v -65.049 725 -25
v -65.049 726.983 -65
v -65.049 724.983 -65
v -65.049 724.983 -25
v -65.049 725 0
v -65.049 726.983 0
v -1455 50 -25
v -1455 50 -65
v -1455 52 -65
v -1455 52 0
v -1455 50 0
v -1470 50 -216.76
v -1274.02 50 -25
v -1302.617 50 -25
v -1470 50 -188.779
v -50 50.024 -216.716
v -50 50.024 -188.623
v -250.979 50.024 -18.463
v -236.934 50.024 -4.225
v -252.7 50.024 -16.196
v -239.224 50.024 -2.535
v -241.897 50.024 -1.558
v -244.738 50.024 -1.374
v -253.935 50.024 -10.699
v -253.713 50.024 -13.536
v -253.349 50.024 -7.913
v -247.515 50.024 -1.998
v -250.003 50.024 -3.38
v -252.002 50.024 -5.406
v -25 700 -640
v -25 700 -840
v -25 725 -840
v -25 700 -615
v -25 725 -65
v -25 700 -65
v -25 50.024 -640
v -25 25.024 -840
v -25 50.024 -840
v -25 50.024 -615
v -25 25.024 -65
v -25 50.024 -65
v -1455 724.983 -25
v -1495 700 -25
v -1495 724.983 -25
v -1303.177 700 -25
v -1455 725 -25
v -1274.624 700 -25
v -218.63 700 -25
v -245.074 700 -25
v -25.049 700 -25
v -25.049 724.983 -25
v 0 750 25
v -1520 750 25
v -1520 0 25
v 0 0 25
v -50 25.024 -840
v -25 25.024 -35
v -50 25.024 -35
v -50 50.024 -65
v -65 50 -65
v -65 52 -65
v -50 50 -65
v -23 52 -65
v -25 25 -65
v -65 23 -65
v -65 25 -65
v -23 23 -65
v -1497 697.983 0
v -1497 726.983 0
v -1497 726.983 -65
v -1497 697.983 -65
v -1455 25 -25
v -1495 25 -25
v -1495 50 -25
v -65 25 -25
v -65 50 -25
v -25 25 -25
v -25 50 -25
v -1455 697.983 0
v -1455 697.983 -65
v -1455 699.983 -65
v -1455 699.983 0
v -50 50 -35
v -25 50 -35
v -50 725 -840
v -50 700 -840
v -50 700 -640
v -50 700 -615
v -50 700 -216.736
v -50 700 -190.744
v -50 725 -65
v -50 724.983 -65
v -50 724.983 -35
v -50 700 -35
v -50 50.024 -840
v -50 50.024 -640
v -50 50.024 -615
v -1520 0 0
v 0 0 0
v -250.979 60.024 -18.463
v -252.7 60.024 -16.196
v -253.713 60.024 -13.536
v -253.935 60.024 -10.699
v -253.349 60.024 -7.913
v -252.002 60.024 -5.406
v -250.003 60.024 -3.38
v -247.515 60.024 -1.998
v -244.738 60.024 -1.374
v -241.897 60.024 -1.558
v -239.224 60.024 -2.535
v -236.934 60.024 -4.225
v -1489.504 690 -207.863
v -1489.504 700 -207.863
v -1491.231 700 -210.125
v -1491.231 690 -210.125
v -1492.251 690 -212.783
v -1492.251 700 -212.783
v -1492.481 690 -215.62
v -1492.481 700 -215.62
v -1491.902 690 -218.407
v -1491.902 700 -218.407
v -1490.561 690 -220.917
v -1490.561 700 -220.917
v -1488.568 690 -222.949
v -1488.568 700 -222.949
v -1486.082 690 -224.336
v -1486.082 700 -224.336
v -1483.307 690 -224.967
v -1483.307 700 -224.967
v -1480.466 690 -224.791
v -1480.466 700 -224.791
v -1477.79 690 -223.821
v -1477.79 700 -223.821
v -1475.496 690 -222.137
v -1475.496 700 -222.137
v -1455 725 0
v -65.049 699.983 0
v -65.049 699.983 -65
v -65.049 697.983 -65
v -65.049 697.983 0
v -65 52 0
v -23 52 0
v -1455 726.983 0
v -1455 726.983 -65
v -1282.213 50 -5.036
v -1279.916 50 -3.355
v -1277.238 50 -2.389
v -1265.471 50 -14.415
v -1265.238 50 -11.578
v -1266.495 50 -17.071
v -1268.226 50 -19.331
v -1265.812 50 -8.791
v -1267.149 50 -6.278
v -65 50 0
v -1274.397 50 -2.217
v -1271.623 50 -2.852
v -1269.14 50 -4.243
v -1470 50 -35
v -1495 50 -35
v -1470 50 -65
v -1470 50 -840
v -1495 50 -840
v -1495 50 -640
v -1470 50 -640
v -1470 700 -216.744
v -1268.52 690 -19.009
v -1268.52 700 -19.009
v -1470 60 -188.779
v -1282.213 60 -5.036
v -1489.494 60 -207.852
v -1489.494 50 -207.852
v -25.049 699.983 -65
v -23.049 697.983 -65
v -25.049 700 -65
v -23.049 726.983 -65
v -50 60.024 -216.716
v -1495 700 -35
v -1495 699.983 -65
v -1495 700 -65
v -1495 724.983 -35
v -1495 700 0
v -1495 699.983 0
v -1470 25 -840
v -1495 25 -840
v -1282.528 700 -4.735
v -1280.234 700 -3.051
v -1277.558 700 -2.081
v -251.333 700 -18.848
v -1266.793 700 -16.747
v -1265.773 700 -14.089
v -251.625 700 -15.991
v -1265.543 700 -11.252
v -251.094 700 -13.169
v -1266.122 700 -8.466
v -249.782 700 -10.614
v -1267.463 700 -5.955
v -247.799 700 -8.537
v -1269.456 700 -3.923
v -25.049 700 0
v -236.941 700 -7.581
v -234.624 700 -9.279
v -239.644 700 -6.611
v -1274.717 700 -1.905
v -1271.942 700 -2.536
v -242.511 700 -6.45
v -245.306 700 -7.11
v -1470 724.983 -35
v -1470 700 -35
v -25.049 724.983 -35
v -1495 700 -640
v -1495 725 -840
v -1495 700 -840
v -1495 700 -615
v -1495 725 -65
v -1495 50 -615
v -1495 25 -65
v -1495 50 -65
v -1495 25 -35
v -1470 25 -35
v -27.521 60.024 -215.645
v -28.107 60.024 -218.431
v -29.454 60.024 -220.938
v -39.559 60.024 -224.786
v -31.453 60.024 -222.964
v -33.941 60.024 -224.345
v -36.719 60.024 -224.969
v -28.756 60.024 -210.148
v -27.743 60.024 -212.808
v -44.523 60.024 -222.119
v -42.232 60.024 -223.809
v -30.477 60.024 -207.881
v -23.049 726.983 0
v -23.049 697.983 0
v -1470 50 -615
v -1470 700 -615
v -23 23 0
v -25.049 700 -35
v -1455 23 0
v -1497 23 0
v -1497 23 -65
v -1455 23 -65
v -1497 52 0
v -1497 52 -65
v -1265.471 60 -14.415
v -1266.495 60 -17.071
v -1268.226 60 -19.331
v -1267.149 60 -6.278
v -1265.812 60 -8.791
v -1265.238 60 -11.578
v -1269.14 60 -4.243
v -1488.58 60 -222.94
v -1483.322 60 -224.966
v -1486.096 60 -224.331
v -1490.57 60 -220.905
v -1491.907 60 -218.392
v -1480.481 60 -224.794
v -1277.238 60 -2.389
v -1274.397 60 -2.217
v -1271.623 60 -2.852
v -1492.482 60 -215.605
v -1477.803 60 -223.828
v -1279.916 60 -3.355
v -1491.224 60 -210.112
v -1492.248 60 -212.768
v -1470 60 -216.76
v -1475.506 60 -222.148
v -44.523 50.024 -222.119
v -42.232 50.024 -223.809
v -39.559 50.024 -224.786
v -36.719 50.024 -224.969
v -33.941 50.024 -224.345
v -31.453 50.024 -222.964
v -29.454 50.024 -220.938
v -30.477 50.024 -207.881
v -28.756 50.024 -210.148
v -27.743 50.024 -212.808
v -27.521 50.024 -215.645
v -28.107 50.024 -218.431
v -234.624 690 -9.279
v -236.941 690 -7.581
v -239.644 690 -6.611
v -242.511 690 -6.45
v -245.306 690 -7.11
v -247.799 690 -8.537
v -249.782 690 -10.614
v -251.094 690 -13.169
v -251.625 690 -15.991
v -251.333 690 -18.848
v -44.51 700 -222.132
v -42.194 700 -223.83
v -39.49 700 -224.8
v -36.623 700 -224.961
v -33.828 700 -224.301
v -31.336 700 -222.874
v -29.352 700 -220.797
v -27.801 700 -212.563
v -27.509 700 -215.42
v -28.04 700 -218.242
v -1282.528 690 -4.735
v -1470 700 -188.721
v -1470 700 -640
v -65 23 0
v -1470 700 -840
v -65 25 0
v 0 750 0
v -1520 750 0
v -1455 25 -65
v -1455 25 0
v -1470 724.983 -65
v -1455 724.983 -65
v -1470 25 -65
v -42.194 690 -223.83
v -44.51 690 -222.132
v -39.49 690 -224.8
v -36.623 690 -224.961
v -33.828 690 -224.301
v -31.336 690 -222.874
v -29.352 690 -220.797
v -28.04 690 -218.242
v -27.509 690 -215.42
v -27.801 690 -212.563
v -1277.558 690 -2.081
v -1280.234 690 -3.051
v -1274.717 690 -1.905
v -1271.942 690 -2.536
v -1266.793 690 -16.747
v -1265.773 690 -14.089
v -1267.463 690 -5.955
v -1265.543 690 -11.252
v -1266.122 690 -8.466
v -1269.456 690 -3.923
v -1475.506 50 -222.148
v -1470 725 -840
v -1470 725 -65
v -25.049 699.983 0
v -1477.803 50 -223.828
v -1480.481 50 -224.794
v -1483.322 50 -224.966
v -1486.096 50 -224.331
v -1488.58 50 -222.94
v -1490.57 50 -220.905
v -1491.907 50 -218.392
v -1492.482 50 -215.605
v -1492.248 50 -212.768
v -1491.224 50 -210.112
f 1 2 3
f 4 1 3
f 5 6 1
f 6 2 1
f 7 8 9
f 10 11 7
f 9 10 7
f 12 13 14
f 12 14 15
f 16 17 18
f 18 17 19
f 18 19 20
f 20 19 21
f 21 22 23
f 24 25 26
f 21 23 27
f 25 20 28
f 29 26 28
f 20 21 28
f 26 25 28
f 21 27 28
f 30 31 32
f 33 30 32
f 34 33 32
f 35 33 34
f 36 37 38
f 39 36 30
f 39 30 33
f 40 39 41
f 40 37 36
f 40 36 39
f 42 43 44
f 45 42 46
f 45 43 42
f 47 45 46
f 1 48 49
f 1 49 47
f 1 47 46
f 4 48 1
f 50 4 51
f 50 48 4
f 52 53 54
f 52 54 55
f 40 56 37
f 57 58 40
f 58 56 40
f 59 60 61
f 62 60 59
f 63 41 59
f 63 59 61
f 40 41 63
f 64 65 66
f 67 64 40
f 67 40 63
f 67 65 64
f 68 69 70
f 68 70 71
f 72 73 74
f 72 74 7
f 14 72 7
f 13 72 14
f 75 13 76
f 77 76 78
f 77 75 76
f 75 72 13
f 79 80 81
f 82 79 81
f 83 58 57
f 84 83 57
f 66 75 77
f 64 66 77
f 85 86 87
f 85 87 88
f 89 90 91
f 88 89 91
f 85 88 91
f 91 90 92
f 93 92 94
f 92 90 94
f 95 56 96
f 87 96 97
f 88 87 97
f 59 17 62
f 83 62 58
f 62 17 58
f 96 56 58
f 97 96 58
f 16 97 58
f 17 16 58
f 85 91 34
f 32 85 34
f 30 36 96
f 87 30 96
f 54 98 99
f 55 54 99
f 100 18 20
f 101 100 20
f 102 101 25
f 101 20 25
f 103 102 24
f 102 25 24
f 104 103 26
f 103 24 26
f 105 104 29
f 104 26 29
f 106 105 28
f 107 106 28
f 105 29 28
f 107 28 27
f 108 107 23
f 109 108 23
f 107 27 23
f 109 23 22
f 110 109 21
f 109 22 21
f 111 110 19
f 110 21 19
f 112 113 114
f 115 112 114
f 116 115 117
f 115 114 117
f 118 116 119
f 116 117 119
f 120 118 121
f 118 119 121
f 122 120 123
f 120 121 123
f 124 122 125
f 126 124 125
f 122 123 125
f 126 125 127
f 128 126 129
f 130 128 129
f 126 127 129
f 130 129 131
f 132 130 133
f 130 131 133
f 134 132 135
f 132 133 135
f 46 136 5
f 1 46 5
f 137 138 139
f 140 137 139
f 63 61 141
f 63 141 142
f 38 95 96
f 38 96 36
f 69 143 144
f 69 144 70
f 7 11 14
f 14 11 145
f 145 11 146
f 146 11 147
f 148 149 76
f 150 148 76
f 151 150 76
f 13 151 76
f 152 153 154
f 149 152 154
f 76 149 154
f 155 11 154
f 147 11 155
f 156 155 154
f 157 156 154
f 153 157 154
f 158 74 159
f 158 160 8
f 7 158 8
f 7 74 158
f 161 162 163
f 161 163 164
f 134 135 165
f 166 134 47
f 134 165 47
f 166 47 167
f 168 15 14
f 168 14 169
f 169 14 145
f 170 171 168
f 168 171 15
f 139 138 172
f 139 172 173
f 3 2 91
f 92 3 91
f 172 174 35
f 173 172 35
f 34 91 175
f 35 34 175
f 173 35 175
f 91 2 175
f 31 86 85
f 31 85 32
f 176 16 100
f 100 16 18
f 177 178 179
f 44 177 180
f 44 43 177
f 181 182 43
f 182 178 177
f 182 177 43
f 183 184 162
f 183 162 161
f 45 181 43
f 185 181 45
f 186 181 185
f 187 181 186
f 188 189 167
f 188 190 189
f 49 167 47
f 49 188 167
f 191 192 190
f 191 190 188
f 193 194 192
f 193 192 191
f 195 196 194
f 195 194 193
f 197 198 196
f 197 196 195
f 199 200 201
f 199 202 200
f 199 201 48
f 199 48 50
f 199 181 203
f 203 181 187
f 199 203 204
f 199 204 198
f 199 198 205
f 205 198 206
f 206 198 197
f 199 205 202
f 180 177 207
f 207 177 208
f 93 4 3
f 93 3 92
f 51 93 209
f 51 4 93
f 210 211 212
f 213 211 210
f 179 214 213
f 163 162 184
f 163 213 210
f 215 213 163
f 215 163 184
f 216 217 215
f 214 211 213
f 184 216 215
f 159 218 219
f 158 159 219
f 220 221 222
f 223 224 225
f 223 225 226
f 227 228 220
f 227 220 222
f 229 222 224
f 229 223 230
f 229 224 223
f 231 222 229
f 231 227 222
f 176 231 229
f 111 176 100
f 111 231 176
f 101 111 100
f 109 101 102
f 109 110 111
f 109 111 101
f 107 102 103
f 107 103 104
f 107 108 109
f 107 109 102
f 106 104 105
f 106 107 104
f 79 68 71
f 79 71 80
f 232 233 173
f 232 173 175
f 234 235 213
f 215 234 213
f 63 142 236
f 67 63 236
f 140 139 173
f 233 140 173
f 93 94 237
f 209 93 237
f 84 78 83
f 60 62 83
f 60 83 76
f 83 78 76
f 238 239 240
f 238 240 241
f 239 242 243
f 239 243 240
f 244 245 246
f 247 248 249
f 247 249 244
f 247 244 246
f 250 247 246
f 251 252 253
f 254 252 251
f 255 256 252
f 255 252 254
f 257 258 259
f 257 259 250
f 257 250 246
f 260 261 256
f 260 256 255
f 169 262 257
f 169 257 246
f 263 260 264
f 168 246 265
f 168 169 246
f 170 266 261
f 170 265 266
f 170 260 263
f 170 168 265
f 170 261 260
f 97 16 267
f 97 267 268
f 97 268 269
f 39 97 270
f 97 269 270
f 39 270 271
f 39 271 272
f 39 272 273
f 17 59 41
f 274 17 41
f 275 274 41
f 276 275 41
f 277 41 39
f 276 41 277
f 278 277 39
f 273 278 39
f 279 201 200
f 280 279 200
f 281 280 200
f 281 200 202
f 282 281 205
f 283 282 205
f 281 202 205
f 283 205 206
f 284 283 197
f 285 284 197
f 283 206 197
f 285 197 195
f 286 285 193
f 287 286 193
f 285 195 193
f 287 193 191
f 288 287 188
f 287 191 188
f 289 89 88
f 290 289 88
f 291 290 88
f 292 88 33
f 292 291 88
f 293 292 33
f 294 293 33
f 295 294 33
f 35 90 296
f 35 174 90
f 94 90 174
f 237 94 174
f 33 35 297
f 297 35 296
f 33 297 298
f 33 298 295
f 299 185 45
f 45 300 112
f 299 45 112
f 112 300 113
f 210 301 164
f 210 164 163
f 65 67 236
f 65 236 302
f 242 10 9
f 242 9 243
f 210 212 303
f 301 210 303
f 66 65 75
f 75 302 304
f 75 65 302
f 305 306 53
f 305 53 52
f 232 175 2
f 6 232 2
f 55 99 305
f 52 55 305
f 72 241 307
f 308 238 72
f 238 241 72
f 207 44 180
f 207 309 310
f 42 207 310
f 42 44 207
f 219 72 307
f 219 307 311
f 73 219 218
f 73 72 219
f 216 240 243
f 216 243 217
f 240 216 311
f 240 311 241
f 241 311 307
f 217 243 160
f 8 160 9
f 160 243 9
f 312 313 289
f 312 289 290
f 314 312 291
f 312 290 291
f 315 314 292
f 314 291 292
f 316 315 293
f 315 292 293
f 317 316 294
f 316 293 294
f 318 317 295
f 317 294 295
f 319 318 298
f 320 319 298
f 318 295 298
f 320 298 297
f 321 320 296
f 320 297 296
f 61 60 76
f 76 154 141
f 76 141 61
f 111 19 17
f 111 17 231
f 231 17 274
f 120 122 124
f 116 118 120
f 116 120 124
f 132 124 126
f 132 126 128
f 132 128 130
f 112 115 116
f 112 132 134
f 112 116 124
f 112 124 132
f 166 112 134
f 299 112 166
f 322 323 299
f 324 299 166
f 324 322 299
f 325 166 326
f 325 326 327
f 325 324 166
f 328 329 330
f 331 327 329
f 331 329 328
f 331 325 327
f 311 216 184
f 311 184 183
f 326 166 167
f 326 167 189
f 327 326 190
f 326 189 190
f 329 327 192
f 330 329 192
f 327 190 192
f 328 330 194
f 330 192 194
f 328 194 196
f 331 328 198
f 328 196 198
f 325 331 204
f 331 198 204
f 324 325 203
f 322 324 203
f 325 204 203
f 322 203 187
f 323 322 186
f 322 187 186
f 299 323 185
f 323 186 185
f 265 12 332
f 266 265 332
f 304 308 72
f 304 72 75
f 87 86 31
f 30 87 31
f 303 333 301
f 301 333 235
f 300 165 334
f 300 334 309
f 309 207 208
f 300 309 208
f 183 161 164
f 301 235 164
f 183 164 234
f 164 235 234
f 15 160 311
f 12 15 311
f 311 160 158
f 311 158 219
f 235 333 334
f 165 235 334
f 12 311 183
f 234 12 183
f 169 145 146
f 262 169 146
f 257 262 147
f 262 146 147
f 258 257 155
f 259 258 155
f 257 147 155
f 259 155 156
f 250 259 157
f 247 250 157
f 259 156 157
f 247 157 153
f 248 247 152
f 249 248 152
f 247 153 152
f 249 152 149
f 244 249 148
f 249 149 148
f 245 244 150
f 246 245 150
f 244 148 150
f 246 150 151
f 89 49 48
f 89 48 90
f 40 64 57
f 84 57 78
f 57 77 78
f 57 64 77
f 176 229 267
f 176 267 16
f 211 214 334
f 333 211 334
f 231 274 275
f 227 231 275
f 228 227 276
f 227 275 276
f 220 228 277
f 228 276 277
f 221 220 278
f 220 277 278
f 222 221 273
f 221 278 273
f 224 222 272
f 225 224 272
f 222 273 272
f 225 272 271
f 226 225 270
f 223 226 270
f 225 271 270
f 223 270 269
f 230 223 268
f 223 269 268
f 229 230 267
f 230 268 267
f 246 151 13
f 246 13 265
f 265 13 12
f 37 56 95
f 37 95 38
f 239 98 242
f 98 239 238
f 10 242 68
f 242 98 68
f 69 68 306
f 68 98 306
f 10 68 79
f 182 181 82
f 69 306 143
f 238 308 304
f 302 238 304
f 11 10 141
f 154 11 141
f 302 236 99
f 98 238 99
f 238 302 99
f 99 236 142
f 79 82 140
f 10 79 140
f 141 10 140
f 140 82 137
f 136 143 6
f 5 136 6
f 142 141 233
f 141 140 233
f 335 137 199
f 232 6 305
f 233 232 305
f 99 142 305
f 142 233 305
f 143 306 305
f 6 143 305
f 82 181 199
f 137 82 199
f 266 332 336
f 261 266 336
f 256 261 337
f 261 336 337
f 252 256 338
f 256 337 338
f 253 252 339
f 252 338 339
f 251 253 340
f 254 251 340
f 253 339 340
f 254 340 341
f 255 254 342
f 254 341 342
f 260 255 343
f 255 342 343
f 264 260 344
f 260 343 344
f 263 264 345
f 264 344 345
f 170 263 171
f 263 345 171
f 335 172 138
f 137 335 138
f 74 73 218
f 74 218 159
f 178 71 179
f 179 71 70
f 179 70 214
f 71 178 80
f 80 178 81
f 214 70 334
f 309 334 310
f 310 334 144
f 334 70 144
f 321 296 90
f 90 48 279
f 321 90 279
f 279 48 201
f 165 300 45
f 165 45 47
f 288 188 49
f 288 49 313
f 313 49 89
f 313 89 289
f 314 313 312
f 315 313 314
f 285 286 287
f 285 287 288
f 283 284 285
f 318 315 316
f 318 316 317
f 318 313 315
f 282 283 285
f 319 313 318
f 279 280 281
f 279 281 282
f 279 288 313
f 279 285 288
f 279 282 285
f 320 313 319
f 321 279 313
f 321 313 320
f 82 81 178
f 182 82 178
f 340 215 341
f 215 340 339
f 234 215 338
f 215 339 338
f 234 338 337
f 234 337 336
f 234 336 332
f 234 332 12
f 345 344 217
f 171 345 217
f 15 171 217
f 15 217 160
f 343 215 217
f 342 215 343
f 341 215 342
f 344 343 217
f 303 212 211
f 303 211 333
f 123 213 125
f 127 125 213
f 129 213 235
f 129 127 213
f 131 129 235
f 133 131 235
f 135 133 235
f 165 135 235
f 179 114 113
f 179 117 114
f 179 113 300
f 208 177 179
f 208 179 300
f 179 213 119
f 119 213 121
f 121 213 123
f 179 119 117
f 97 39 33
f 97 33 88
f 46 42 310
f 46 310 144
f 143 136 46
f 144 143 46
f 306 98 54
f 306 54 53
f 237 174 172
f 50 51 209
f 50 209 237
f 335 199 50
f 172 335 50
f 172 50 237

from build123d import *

# Parameters (mm, degrees)
F0_W      = 1520
F0_H      = 750
F1_DEPTH  = 25
F2_W      = 1470
F2_H      = 25
F3_DEPTH  = 25
F5_DEPTH  = 65
F7_W      = 25
F7_H      = 25
F8_DEPTH  = 805
F10_DEPTH = 65
F12_W     = 25
F12_H     = 25
F13_DEPTH = 805
F15_W     = 25
F15_H     = 25
F16_DEPTH = 805
F18_W     = 25
F18_H     = 25
F19_DEPTH = 650
F21_W     = 25
F21_H     = 25
F22_DEPTH = 650
F24_DEPTH = 10
F26_DEPTH = 10
F29_DEPTH = 10
F31_DEPTH = 10


with BuildPart() as f1:
    # F0 (on Top) → F1 (new body)
    with BuildSketch(Plane.XY):
        with Locations((-760, 375)):
            Rectangle(F0_W, F0_H)
    extrude(amount=F1_DEPTH)

    # F2 (on face) → F3 (join)
    with BuildSketch(Plane(origin=(0, 0, 0), x_dir=(1, 0, 0), z_dir=(0, 0, -1))):
        with Locations((-760, -37.5)):
            Rectangle(F2_W, F2_H)
        with Locations((-760, -712.5)):
            Rectangle(F2_W, F2_H)
    extrude(amount=F3_DEPTH)

    # F4 (on face) → F5 (join)
    with BuildSketch(Plane(origin=(0, 0, 0), x_dir=(1, 0, 0), z_dir=(0, 0, -1))):
        Polygon((-65, -25), (-25, -25), (-25, -50), (-65, -50), (-65, -52), (-23, -52), (-23, -23), (-65, -23), align=None)
    extrude(amount=F5_DEPTH)

    # F7 (on offset) → F8 (join)
    with BuildSketch(Plane(origin=(0, 0, -35), x_dir=(1, 0, 0), z_dir=(0, 0, -1))):
        with Locations((-37.5, -37.523640207)):
            Rectangle(F7_W, F7_H)
    extrude(amount=F8_DEPTH)

    # F9 (on face) → F10 (join)
    with BuildSketch(Plane.XY):
        Polygon((-1495, 724.9829173088), (-1455, 724.9829173088), (-1455, 726.9829173088), (-1497, 726.9829173088), (-1497, 697.9829173088), (-1455, 697.9829173088), (-1455, 699.9829173088), (-1495, 699.9829173088), align=None)
        Polygon((-65.0490959734, 726.9829173088), (-65.0490959734, 724.9829173088), (-25.0490959734, 724.9829173088), (-25.0490959734, 699.9829173088), (-65.0490959734, 699.9829173088), (-65.0490959734, 697.9829173088), (-23.0490959734, 697.9829173088), (-23.0490959734, 726.9829173088), align=None)
        Polygon((-1455, 25), (-1495, 25), (-1495, 50), (-1455, 50), (-1455, 52), (-1497, 52), (-1497, 23), (-1455, 23), align=None)
    extrude(amount=-F10_DEPTH)

    # F12 (on offset) → F13 (join)
    with BuildSketch(Plane(origin=(0, 0, -35), x_dir=(1, 0, 0), z_dir=(0, 0, -1))):
        with Locations((-1482.5, -37.5)):
            Rectangle(F12_W, F12_H)
    extrude(amount=F13_DEPTH)

    # F15 (on offset) → F16 (join)
    with BuildSketch(Plane(origin=(0, 0, -35), x_dir=(1, 0, 0), z_dir=(0, 0, -1))):
        with Locations((-37.5, -712.5)):
            Rectangle(F15_W, F15_H)
        with Locations((-1482.5, -712.5)):
            Rectangle(F15_W, F15_H)
    extrude(amount=F16_DEPTH)

    # F18 (on offset) → F19 (join)
    with BuildSketch(Plane(origin=(0, 50.023640207, 0), x_dir=(-1, 0, 0), z_dir=(0, 1, 0))):
        with Locations((37.5, -627.5)):
            Rectangle(F18_W, F18_H)
    extrude(amount=F19_DEPTH)

    # F21 (on offset) → F22 (join)
    with BuildSketch(Plane(origin=(0, 50, 0), x_dir=(-1, 0, 0), z_dir=(0, 1, 0))):
        with Locations((1482.5, -627.5)):
            Rectangle(F21_W, F21_H)
    extrude(amount=F22_DEPTH)

    # F23 (on face) → F24 (join)
    with BuildSketch(Plane.XZ.offset(-700)):
        with BuildLine():
            Line((-50, -190.7444713597), (-234.6244849475, -9.2794851613))
            ThreePointArc((-234.6244849475, -9.2794851613), (-246.6039118675, -7.7336055545), (-251.332803081, -18.8481906111))
            Line((-251.332803081, -18.8481906111), (-50, -216.7355636904))
            Line((-50, -216.7355636904), (-50, -190.7444713597))
        make_face()
        with BuildLine():
            Line((-27.8014624786, -212.5631229112), (-50, -190.7444713597))
            Line((-50, -190.7444713597), (-50, -216.7355636904))
            Line((-50, -216.7355636904), (-44.5097806121, -222.131828361))
            ThreePointArc((-44.5097806121, -222.131828361), (-32.5303536921, -223.6777079678), (-27.8014624786, -212.5631229112))
        make_face()
    extrude(amount=F24_DEPTH)

    # F25 (on face) → F26 (join)
    with BuildSketch(Plane(origin=(0, 50.023640207, 0), x_dir=(-1, 0, 0), z_dir=(0, 1, 0))):
        with BuildLine():
            Line((50, -188.6229664357), (50, -216.7160920101))
            Line((50, -216.7160920101), (250.9788283543, -18.4630064225))
            ThreePointArc((250.9788283543, -18.4630064225), (251.07538107, -4.3212004002), (236.9335750477, -4.2246476845))
            Line((236.9335750477, -4.2246476845), (50, -188.6229664357))
        make_face()
        with BuildLine():
            ThreePointArc((30.4773733467, -207.880820631), (30.380820631, -222.0226266533), (44.5226266533, -222.119179369))
            Line((44.5226266533, -222.119179369), (50, -216.7160920101))
            Line((50, -216.7160920101), (50, -188.6229664357))
            Line((50, -188.6229664357), (30.4773733467, -207.880820631))
        make_face()
    extrude(amount=F26_DEPTH)

    # F28 (on offset) → F29 (join)
    with BuildSketch(Plane.XZ.offset(-700)):
        with BuildLine():
            ThreePointArc((-1268.519621658, -19.0091897955), (-1268.3869301053, -4.8676766886), (-1282.5284432121, -4.7349851358))
            Line((-1282.5284432121, -4.7349851358), (-1489.504410777, -207.8628976702))
            ThreePointArc((-1489.504410777, -207.8628976702), (-1489.6371023298, -222.004410777), (-1475.495589223, -222.1371023298))
            Line((-1475.495589223, -222.1371023298), (-1268.519621658, -19.0091897955))
        make_face()
    extrude(amount=F29_DEPTH)

    # F30 (on face) → F31 (join)
    with BuildSketch(Plane(origin=(0, 50, 0), x_dir=(-1, 0, 0), z_dir=(0, 1, 0))):
        with BuildLine():
            ThreePointArc((1475.506314972, -222.1476128693), (1489.6476128693, -221.993685028), (1489.493685028, -207.8523871307))
            Line((1489.493685028, -207.8523871307), (1470, -188.7785095141))
            Line((1470, -188.7785095141), (1470, -216.7598794703))
            Line((1470, -216.7598794703), (1475.506314972, -222.1476128693))
        make_face()
        with BuildLine():
            Line((1470, -216.7598794703), (1470, -188.7785095141))
            Line((1470, -188.7785095141), (1282.212911818, -5.0355213195))
            ThreePointArc((1282.212911818, -5.0355213195), (1268.0716139207, -5.1894491609), (1268.225541762, -19.3307470582))
            Line((1268.225541762, -19.3307470582), (1470, -216.7598794703))
        make_face()
    extrude(amount=F31_DEPTH)


solid = f1.part
